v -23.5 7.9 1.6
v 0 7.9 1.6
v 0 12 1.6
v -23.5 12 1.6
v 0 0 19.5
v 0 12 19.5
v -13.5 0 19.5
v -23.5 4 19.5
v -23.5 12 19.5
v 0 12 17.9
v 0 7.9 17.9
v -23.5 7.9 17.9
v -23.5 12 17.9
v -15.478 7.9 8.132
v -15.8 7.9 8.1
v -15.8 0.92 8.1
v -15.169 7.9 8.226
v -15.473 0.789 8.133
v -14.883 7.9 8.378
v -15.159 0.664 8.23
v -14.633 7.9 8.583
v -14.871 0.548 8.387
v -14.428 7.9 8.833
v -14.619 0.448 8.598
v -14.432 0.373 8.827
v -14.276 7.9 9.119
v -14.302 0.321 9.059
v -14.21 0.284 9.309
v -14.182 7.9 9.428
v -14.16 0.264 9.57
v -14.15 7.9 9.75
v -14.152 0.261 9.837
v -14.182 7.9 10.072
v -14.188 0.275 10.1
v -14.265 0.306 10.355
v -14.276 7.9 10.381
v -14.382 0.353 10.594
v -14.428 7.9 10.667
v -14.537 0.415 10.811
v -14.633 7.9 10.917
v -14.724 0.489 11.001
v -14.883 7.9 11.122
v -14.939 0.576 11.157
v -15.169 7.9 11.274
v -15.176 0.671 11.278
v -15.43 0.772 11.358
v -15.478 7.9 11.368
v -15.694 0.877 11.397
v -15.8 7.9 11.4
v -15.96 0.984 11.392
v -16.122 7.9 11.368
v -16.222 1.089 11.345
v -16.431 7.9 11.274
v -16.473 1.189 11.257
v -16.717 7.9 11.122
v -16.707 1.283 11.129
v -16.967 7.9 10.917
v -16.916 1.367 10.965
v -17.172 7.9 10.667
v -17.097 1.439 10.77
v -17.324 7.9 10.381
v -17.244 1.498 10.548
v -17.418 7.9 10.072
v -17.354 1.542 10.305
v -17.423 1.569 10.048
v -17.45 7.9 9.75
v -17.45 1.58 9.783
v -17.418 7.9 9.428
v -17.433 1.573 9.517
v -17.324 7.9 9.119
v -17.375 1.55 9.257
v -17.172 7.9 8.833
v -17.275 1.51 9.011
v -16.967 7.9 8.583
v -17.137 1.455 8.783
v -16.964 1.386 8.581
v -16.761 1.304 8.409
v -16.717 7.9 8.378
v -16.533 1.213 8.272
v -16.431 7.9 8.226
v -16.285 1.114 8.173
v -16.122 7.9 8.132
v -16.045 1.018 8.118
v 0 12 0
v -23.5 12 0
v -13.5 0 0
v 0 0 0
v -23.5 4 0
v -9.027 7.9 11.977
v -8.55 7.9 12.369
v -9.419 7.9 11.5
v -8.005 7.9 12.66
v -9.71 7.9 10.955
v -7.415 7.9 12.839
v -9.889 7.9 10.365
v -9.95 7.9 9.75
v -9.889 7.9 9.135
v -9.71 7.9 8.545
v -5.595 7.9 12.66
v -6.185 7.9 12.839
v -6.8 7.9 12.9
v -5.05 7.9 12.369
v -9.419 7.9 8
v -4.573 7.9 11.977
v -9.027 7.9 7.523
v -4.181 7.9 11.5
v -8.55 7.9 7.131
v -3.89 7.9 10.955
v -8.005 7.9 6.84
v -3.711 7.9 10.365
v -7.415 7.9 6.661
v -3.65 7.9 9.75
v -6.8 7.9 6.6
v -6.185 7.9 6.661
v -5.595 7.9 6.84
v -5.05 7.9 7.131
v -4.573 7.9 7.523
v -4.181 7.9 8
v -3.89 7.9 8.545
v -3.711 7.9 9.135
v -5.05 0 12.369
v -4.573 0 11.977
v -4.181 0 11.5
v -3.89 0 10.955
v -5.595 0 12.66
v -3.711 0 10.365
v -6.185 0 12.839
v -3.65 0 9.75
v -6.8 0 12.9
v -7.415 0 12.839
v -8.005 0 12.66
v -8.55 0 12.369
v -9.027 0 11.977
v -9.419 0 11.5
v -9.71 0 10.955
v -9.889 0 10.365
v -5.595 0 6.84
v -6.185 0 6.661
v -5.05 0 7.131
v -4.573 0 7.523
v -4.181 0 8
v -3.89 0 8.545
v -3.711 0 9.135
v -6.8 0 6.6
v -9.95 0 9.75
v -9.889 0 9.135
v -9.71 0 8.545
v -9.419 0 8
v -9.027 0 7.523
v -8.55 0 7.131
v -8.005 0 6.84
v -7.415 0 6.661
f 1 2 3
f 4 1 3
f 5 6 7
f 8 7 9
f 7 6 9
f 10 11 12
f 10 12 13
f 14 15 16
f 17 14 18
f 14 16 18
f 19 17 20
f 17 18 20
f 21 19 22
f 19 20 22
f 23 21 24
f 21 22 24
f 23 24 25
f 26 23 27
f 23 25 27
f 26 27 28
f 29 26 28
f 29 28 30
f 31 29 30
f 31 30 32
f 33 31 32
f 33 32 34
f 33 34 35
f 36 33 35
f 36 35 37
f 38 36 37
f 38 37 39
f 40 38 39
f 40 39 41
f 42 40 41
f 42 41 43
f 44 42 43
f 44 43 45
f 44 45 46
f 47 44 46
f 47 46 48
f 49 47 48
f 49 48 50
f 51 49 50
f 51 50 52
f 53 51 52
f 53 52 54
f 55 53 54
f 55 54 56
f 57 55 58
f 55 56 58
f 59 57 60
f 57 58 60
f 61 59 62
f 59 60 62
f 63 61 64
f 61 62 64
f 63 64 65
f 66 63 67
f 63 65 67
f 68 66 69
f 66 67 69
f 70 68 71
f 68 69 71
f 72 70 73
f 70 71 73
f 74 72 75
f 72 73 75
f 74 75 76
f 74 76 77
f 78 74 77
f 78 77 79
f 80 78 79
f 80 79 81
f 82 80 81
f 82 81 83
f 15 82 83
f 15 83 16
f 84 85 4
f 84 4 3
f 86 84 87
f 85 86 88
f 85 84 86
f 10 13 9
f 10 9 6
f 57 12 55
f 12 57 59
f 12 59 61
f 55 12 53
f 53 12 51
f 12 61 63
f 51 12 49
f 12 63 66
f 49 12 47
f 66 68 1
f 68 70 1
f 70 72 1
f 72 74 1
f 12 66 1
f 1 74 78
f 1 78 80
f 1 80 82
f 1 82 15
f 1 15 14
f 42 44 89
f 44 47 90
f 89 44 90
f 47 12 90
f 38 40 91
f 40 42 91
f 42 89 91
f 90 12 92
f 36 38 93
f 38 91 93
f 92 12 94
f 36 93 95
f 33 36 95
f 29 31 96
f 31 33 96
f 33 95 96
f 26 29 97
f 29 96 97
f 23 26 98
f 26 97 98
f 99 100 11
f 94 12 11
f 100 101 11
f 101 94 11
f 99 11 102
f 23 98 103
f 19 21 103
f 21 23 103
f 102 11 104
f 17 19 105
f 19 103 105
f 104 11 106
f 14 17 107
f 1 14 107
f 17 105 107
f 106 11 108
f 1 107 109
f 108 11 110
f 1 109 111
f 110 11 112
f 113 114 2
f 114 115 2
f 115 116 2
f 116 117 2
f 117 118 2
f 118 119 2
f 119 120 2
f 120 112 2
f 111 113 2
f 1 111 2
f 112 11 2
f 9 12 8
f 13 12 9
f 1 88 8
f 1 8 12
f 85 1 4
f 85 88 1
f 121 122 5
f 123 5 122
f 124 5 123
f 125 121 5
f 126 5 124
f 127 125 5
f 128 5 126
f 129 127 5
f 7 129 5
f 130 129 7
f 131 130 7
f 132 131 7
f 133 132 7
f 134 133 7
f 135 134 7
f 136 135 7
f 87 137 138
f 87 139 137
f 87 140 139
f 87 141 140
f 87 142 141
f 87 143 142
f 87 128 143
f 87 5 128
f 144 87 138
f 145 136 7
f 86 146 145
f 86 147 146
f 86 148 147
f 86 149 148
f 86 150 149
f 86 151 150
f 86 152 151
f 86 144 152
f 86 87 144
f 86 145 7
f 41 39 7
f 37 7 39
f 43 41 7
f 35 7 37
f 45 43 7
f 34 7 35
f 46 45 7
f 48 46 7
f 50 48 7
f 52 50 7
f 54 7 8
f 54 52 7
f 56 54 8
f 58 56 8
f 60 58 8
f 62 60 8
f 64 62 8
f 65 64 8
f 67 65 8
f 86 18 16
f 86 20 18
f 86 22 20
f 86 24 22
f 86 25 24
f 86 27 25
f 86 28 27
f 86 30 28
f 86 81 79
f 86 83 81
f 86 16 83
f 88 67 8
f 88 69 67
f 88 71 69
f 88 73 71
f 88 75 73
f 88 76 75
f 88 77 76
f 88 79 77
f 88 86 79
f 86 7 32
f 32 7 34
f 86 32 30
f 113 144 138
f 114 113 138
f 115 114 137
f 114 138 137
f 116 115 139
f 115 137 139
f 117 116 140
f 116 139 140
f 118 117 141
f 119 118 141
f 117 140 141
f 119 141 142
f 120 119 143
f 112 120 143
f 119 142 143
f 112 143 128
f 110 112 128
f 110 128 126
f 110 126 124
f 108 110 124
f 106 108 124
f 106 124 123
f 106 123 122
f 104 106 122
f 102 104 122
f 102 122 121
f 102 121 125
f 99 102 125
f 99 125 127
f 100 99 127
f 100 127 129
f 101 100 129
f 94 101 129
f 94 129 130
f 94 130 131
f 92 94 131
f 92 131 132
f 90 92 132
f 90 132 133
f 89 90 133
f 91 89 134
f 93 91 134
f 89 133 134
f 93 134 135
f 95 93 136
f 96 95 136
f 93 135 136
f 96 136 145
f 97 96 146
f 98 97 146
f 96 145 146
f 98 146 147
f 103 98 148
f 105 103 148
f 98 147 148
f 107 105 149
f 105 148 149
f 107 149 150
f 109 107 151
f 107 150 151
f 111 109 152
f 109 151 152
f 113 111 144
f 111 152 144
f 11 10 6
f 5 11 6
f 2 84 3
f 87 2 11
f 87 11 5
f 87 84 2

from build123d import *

# Parameters (mm, degrees)
EXTRUDE1_DEPTH            = 19.5
SKETCH2_W                 = 16.3
SKETCH2_H                 = 4.1
CUT_EXTRUDE1_DEPTH        = 33.810059433
M6_3_6_3_DIAMETER_HOLE1_D = 6.3
M4X0_7_TAPPED_HOLE1_D     = 3.3
M4X0_7_TAPPED_HOLE1_DEPTH = 10.1
M4X0_7_TAPPED_HOLE1_TIP   = 0.991420021


with BuildPart() as part:
    # Sketch1 → Extrude1 (new body)
    with BuildSketch(Plane.XY):
        Polygon((-13.5, 0), (-23.5, 4), (-23.5, 12), (0, 12), (0, 0), align=None)
    extrude(amount=EXTRUDE1_DEPTH)

    # Sketch2 → Cut-Extrude1 (cut, through all)
    with BuildSketch(Plane(origin=(0, 0, 0), x_dir=(0, 0, -1), z_dir=(1, 0, 0))):
        with Locations((-9.75, 9.95)):
            Rectangle(SKETCH2_W, SKETCH2_H)
    extrude(amount=-CUT_EXTRUDE1_DEPTH, mode=Mode.SUBTRACT)

    # M6.3 (6.3) Diameter Hole1 (through all)
    with Locations(Plane(origin=(-6.8, 7.9, 9.75), x_dir=(0, 0, 1), z_dir=(0, 1, 0))):
        with Locations((0, 0)):
            Hole(M6_3_6_3_DIAMETER_HOLE1_D / 2)

    # M4x0.7 Tapped Hole1
    with Locations(Plane(origin=(-15.8, 7.9, 9.75), x_dir=(0, 0, 1), z_dir=(0, 1, 0))):
        with Locations((0, 0)):
            Hole(M4X0_7_TAPPED_HOLE1_D / 2, depth=M4X0_7_TAPPED_HOLE1_DEPTH)
            with Locations((0, 0, -(M4X0_7_TAPPED_HOLE1_DEPTH + M4X0_7_TAPPED_HOLE1_TIP / 2))):  # 118° drill point
                Cone(0, M4X0_7_TAPPED_HOLE1_D / 2, M4X0_7_TAPPED_HOLE1_TIP, mode=Mode.SUBTRACT)


solid = part.part
